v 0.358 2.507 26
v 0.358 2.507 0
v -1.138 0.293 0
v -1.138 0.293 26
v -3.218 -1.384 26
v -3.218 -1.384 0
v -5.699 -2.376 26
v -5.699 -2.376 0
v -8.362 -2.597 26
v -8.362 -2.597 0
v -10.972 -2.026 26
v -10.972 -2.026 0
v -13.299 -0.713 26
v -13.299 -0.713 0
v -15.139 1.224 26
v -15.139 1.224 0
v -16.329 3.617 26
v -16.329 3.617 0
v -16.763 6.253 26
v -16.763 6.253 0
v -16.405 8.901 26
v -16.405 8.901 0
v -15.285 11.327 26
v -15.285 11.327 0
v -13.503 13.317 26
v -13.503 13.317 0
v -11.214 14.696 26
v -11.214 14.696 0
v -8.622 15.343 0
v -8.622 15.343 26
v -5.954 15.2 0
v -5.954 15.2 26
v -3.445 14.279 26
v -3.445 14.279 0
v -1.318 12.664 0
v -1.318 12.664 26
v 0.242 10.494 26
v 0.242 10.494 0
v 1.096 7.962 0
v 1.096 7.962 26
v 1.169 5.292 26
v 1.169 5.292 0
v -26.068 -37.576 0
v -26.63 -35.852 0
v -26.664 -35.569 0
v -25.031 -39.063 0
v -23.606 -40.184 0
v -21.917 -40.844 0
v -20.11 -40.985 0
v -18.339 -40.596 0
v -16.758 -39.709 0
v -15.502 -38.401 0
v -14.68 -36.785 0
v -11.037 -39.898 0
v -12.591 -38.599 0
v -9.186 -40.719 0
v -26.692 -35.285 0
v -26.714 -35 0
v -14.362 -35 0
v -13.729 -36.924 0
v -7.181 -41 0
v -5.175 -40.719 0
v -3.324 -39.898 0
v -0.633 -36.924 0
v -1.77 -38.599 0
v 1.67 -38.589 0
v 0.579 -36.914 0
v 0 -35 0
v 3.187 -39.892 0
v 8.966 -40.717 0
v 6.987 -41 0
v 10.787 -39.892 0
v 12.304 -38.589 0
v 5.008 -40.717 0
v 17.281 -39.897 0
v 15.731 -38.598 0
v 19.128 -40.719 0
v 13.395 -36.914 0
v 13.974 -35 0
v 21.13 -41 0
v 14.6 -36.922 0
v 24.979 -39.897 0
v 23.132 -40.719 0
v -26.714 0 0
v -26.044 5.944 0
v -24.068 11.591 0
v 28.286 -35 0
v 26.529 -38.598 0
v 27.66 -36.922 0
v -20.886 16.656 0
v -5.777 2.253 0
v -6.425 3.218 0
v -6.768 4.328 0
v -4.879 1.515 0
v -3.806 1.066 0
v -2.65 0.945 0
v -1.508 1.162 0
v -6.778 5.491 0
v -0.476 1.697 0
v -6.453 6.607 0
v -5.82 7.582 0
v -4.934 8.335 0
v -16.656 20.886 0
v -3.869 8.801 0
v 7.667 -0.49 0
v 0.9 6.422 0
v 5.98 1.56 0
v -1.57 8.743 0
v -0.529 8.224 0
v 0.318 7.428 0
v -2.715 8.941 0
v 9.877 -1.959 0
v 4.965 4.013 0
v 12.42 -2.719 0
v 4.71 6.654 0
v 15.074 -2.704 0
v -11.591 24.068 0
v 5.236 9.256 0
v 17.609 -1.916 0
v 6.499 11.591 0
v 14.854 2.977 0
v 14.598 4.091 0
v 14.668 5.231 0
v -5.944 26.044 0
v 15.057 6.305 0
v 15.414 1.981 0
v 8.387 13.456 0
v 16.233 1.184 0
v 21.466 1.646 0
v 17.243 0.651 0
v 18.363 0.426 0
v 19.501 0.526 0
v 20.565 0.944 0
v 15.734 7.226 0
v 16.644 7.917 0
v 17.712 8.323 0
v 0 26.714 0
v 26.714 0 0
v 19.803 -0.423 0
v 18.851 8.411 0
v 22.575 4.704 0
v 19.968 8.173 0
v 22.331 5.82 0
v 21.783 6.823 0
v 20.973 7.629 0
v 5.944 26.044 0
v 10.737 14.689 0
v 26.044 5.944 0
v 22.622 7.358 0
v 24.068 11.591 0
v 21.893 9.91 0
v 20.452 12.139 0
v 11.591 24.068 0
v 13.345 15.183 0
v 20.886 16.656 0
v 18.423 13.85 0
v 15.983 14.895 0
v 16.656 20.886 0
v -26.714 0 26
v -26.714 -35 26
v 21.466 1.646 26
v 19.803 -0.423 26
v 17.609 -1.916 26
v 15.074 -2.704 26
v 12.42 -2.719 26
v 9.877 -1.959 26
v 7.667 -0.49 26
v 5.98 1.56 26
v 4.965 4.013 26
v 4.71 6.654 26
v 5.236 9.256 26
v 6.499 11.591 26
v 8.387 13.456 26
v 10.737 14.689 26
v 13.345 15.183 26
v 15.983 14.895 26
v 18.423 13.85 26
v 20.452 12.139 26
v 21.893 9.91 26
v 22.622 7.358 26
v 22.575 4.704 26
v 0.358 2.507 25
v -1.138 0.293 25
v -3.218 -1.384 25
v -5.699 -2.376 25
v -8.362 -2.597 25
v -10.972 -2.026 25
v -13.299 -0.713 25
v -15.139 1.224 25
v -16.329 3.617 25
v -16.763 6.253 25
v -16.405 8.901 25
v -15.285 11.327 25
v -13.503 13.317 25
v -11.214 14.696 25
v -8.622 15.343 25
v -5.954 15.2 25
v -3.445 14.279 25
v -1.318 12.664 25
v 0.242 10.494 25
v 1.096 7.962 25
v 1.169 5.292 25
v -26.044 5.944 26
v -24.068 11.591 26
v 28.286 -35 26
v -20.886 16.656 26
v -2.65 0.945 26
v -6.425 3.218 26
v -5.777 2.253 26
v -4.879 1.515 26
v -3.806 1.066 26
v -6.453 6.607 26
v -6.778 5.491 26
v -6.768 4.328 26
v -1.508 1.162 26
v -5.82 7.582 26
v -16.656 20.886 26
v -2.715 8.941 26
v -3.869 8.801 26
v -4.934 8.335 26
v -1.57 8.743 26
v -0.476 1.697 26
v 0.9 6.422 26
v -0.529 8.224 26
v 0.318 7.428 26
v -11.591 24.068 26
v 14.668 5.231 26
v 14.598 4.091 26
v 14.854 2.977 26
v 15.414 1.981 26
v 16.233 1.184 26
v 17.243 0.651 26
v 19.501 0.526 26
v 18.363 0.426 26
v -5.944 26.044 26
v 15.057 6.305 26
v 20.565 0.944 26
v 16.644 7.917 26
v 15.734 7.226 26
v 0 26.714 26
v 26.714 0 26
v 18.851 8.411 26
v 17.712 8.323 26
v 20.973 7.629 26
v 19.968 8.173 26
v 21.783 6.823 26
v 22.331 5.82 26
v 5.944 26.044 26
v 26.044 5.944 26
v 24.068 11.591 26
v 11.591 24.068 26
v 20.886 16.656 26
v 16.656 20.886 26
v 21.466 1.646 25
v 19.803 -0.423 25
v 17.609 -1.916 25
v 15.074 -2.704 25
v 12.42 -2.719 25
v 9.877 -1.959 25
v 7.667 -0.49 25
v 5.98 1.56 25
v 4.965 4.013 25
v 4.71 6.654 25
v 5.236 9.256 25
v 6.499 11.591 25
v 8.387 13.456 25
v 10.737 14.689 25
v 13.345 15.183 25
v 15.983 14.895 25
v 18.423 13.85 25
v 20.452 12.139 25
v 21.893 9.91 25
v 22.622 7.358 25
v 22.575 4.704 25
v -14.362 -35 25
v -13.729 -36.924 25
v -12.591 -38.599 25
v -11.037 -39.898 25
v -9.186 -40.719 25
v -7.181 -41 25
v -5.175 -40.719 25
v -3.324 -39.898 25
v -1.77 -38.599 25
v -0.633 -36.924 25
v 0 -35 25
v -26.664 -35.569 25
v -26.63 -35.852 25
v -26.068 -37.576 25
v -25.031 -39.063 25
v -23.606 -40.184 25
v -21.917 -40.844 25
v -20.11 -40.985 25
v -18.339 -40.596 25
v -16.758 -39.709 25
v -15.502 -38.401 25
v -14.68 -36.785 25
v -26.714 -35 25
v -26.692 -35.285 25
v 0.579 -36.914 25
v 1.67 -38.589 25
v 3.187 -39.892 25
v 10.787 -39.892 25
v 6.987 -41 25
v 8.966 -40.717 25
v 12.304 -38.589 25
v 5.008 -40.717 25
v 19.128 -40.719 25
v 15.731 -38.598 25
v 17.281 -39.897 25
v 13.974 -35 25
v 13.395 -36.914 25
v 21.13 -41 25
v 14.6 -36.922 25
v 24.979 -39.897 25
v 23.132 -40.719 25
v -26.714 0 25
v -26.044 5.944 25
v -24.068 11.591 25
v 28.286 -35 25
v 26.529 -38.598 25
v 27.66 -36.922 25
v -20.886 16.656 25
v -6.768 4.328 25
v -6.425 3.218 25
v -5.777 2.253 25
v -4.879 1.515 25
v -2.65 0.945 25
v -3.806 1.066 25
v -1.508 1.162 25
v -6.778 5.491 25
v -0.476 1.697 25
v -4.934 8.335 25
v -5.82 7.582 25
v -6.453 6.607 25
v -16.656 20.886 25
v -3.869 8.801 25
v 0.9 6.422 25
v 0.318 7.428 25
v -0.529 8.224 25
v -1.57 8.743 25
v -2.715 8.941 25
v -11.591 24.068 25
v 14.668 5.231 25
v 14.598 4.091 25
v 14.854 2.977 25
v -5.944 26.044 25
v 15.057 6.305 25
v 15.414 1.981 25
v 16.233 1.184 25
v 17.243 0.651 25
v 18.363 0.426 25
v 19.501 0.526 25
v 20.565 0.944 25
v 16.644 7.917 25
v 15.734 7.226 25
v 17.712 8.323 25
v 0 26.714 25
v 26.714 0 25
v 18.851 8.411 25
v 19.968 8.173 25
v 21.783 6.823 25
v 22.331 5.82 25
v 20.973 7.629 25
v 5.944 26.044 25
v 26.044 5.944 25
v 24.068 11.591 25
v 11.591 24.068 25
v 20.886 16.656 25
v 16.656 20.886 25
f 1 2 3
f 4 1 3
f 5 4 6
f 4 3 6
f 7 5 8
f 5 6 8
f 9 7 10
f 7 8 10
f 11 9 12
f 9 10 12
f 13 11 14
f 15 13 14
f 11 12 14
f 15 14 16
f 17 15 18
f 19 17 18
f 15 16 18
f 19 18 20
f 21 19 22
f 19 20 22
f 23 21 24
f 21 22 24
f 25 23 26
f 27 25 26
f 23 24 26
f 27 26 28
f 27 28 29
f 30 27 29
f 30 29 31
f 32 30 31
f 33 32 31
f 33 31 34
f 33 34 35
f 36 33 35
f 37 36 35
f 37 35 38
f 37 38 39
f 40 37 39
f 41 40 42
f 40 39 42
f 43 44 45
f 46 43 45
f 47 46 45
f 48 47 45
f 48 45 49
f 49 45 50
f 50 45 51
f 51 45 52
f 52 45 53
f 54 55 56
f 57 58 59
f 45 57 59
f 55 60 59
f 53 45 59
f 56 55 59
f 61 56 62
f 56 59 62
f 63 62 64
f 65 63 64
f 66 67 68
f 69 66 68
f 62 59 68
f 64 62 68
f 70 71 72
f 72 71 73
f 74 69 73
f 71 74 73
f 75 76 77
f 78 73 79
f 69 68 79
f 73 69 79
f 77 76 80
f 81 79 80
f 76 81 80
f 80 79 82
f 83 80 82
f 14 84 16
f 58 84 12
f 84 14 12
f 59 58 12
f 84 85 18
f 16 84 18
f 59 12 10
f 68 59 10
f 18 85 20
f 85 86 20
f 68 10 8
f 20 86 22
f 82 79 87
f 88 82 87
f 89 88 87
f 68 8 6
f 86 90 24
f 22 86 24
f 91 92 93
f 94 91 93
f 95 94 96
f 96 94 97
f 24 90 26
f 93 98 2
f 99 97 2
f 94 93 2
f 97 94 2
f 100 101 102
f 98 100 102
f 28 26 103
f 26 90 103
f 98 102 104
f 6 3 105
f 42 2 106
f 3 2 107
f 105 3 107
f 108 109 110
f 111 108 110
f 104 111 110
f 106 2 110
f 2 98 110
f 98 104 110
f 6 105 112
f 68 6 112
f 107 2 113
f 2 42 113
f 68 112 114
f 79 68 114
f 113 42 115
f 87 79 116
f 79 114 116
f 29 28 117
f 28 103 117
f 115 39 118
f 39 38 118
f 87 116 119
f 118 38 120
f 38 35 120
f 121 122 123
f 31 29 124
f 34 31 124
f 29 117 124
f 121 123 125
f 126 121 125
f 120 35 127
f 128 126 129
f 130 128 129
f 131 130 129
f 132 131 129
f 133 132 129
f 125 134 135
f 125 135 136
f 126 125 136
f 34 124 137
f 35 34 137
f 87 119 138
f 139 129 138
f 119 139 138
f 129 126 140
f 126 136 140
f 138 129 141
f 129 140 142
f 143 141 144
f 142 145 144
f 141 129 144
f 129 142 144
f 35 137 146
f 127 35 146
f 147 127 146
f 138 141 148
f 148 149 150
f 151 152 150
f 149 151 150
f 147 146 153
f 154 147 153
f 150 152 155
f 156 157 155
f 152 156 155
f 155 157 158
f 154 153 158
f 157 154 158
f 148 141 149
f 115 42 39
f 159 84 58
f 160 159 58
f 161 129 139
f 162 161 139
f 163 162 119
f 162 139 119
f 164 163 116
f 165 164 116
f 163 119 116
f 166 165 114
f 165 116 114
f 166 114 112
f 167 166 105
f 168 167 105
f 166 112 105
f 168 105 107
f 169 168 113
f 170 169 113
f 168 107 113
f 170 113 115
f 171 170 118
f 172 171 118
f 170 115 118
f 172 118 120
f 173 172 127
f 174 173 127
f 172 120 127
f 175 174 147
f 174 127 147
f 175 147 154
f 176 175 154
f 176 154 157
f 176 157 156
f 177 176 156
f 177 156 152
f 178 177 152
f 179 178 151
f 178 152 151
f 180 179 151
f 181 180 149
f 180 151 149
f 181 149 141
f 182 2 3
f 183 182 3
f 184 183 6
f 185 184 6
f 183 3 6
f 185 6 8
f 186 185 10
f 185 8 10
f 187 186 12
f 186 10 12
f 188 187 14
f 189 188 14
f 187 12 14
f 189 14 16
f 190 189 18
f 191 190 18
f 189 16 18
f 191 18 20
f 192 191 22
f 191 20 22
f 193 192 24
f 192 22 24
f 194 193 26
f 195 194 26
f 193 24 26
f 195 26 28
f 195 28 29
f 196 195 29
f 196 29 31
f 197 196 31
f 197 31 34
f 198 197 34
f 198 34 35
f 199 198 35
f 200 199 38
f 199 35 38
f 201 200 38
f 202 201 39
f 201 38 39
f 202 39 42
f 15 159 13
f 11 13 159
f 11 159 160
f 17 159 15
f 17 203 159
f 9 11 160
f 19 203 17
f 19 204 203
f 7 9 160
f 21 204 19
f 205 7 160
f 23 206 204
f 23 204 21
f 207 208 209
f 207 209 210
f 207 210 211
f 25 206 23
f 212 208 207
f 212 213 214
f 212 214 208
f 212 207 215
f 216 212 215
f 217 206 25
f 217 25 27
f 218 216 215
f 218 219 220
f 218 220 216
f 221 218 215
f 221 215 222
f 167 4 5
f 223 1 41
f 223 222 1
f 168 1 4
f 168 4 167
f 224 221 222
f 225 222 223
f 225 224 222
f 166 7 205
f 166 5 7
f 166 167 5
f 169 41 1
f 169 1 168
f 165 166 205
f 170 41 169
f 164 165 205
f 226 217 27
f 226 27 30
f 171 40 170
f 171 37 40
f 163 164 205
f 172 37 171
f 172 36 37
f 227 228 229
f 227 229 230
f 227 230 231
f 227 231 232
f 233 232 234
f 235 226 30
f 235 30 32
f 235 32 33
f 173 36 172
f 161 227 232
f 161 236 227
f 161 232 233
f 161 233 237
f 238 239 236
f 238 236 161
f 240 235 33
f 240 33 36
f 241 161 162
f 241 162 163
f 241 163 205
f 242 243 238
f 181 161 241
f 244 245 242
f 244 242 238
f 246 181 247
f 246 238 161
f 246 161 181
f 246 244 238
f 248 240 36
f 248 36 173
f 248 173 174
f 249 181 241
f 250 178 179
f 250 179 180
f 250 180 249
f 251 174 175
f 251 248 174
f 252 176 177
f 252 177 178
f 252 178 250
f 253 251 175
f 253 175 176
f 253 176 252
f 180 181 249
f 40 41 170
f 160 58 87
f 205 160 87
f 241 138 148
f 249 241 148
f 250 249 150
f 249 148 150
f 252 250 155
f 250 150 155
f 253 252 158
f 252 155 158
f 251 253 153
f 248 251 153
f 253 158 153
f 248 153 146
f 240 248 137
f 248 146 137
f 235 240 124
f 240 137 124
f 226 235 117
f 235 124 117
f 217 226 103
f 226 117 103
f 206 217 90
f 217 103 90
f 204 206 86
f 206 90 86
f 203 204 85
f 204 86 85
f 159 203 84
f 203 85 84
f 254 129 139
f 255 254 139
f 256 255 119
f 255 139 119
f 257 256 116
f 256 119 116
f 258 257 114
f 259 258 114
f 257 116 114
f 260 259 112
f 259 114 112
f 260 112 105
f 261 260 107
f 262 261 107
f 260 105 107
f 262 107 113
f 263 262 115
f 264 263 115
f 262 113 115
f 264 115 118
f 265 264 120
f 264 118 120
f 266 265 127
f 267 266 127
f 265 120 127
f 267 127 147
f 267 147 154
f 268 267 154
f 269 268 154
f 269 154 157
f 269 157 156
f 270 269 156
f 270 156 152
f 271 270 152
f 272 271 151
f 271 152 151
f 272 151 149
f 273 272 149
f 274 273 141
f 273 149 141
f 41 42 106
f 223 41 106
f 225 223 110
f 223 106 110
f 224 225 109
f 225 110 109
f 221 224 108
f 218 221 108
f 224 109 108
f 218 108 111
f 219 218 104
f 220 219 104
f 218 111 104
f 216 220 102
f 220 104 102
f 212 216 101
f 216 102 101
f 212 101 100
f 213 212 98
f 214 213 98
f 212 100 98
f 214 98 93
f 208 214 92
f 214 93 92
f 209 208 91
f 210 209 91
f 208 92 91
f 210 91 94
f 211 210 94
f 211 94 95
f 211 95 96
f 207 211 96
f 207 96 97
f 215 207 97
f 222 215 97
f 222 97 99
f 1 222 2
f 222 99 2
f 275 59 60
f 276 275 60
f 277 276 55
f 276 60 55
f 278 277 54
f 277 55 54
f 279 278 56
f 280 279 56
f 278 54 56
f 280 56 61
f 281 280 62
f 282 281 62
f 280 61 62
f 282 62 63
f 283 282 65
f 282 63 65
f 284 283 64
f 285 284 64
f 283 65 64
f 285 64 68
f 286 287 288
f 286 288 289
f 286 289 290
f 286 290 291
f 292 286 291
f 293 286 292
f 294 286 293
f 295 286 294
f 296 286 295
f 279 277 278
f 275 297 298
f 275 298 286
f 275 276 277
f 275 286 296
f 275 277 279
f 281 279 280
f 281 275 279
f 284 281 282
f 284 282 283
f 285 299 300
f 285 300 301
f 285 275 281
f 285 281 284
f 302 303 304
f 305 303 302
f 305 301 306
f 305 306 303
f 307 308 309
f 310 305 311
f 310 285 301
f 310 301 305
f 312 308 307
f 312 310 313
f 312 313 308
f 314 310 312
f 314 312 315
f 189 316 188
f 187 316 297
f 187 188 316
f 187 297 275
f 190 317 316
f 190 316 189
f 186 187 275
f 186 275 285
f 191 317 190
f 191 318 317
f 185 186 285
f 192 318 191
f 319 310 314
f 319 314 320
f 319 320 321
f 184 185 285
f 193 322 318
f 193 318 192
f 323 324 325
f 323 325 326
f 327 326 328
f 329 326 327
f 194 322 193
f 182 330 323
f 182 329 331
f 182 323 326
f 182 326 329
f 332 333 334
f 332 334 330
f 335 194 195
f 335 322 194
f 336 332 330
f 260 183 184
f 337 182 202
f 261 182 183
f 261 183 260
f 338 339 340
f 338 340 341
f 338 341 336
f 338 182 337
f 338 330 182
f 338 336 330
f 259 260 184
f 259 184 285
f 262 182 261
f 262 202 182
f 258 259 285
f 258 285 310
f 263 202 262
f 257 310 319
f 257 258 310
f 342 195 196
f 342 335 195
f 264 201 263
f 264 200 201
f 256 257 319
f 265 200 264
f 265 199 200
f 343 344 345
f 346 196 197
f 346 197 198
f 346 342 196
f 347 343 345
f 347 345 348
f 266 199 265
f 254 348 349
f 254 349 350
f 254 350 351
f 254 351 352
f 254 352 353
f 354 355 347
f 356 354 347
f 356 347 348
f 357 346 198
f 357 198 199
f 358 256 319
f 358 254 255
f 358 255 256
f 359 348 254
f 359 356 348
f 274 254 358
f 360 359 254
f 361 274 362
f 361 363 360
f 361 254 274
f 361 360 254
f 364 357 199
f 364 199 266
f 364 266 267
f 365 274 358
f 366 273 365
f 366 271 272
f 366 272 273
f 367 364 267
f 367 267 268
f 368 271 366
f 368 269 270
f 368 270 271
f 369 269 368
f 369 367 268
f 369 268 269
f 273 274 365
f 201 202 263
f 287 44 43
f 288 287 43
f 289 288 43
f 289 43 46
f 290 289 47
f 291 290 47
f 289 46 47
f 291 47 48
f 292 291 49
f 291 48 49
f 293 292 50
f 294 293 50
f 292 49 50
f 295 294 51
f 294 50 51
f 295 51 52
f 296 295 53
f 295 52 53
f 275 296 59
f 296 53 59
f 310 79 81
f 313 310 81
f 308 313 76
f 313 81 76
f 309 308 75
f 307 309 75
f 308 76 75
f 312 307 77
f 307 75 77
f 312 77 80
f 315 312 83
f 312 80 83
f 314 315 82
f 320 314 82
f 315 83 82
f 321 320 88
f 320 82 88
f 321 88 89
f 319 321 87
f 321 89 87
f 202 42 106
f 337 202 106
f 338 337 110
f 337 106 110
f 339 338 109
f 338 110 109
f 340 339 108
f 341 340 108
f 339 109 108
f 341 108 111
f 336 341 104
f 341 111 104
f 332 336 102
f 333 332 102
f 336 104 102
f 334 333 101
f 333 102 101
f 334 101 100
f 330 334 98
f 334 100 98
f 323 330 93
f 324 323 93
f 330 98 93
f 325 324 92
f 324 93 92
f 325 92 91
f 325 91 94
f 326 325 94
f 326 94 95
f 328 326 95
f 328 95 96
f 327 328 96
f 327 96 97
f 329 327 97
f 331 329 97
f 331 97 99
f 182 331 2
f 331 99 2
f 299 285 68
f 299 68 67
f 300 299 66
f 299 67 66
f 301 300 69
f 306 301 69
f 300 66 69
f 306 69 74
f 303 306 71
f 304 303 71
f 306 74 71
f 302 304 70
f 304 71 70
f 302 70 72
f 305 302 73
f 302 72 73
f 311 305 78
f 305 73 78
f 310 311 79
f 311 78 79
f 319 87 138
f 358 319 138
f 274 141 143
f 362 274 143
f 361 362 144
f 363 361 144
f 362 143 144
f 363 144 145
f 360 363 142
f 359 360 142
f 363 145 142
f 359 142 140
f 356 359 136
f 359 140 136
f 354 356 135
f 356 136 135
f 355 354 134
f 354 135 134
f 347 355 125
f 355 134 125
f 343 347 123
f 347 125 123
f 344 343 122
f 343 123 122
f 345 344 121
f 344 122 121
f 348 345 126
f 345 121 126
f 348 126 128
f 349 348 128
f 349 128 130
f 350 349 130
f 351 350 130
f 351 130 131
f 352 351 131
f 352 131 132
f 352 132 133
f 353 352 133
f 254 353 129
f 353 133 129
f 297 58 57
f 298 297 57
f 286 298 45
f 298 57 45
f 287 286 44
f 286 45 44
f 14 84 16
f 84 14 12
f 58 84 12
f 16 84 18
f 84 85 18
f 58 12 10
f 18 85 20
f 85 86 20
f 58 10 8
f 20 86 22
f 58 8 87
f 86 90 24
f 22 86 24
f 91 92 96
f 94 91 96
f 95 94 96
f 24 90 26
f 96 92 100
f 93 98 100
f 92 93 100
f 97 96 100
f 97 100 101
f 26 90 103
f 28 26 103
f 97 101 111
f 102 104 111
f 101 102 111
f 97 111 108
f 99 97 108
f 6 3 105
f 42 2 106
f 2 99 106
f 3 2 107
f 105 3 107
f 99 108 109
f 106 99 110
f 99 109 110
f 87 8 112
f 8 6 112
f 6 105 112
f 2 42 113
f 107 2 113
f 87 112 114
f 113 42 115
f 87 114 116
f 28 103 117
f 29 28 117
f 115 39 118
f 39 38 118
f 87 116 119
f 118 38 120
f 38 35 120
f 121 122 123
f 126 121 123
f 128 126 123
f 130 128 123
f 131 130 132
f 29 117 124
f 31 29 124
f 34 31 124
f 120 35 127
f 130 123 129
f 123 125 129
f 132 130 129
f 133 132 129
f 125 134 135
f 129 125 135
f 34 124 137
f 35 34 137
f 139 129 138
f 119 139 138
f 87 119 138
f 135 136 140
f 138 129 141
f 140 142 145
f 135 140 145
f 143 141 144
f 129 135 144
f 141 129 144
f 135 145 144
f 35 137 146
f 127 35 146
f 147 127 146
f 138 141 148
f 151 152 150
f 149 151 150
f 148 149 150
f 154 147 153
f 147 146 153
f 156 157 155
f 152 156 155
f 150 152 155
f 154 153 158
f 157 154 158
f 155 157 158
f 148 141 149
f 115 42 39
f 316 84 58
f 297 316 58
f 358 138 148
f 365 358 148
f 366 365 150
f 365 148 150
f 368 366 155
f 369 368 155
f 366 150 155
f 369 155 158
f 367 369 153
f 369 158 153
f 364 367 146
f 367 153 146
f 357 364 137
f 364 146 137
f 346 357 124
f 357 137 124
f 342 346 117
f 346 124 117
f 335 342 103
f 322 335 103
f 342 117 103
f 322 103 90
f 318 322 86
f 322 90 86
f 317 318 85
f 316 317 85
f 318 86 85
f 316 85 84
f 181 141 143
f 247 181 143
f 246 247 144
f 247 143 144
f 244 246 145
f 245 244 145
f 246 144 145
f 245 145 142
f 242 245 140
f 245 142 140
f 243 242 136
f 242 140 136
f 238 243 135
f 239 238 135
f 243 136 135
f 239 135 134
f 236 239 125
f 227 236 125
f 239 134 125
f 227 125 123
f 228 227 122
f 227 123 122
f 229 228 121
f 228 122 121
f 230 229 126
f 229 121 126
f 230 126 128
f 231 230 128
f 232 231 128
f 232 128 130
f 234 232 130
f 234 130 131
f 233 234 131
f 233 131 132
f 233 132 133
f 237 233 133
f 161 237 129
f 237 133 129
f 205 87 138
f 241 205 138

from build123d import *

# Parameters (mm, degrees)
F1_DEPTH = 25
F2_DEPTH = 26


with BuildPart() as f1:
    # F0 (on Top) → F1 (new body)
    with BuildSketch(Plane.XY):
        with BuildLine():
            Line((28.28632, -35), (26.71368, 0))
            ThreePointArc((26.71368, 0), (0, 26.71368), (-26.71368, 0))
            Line((-26.71368, 0), (-26.71368, -35))
            Line((-26.71368, -35), (-14.361817, -35))
            Line((-14.361817, -35), (0, -35))
            Line((0, -35), (13.973511, -35))
            Line((13.973511, -35), (28.28632, -35))
        make_face()
        with BuildLine():
            ThreePointArc((0.357959, 2.506888), (-16.405143, 8.900753), (1.169173, 5.291524))
            ThreePointArc((1.169173, 5.291524), (-6.655875, 6.06062), (0.357959, 2.506888))
        make_face(mode=Mode.SUBTRACT)
        with BuildLine():
            ThreePointArc((21.466499, 1.645763), (5.236335, 9.255928), (22.574534, 4.704041))
            ThreePointArc((22.574534, 4.704041), (14.823874, 5.782296), (21.466499, 1.645763))
        make_face(mode=Mode.SUBTRACT)
        with BuildLine():
            Line((-14.361817, -35), (-26.71368, -35))
            ThreePointArc((-26.71368, -35), (-26.67851, -35.426676), (-26.629713, -35.85201))
            ThreePointArc((-26.629713, -35.85201), (-20.10968, -40.985153), (-14.361817, -35))
        make_face()
        with BuildLine():
            Line((0, -35), (-14.361817, -35))
            ThreePointArc((-14.361817, -35), (-7.180909, -41), (0, -35))
        make_face()
        with BuildLine():
            ThreePointArc((0, -35), (6.986756, -41), (13.973511, -35))
            Line((13.973511, -35), (0, -35))
        make_face()
        with BuildLine():
            ThreePointArc((13.973511, -35), (21.129916, -41), (28.28632, -35))
            Line((28.28632, -35), (13.973511, -35))
        make_face()
    extrude(amount=F1_DEPTH)


with BuildPart() as f2:
    # F0 (on Top) → F2 (new body)
    with BuildSketch(Plane.XY):
        with BuildLine():
            Line((28.28632, -35), (26.71368, 0))
            ThreePointArc((26.71368, 0), (0, 26.71368), (-26.71368, 0))
            Line((-26.71368, 0), (-26.71368, -35))
            Line((-26.71368, -35), (-14.361817, -35))
            Line((-14.361817, -35), (0, -35))
            Line((0, -35), (13.973511, -35))
            Line((13.973511, -35), (28.28632, -35))
        make_face()
        with BuildLine():
            ThreePointArc((0.357959, 2.506888), (-16.405143, 8.900753), (1.169173, 5.291524))
            ThreePointArc((1.169173, 5.291524), (-6.655875, 6.06062), (0.357959, 2.506888))
        make_face(mode=Mode.SUBTRACT)
        with BuildLine():
            ThreePointArc((21.466499, 1.645763), (5.236335, 9.255928), (22.574534, 4.704041))
            ThreePointArc((22.574534, 4.704041), (14.823874, 5.782296), (21.466499, 1.645763))
        make_face(mode=Mode.SUBTRACT)
    extrude(amount=F2_DEPTH)


solid = Compound([f1.part, f2.part])
